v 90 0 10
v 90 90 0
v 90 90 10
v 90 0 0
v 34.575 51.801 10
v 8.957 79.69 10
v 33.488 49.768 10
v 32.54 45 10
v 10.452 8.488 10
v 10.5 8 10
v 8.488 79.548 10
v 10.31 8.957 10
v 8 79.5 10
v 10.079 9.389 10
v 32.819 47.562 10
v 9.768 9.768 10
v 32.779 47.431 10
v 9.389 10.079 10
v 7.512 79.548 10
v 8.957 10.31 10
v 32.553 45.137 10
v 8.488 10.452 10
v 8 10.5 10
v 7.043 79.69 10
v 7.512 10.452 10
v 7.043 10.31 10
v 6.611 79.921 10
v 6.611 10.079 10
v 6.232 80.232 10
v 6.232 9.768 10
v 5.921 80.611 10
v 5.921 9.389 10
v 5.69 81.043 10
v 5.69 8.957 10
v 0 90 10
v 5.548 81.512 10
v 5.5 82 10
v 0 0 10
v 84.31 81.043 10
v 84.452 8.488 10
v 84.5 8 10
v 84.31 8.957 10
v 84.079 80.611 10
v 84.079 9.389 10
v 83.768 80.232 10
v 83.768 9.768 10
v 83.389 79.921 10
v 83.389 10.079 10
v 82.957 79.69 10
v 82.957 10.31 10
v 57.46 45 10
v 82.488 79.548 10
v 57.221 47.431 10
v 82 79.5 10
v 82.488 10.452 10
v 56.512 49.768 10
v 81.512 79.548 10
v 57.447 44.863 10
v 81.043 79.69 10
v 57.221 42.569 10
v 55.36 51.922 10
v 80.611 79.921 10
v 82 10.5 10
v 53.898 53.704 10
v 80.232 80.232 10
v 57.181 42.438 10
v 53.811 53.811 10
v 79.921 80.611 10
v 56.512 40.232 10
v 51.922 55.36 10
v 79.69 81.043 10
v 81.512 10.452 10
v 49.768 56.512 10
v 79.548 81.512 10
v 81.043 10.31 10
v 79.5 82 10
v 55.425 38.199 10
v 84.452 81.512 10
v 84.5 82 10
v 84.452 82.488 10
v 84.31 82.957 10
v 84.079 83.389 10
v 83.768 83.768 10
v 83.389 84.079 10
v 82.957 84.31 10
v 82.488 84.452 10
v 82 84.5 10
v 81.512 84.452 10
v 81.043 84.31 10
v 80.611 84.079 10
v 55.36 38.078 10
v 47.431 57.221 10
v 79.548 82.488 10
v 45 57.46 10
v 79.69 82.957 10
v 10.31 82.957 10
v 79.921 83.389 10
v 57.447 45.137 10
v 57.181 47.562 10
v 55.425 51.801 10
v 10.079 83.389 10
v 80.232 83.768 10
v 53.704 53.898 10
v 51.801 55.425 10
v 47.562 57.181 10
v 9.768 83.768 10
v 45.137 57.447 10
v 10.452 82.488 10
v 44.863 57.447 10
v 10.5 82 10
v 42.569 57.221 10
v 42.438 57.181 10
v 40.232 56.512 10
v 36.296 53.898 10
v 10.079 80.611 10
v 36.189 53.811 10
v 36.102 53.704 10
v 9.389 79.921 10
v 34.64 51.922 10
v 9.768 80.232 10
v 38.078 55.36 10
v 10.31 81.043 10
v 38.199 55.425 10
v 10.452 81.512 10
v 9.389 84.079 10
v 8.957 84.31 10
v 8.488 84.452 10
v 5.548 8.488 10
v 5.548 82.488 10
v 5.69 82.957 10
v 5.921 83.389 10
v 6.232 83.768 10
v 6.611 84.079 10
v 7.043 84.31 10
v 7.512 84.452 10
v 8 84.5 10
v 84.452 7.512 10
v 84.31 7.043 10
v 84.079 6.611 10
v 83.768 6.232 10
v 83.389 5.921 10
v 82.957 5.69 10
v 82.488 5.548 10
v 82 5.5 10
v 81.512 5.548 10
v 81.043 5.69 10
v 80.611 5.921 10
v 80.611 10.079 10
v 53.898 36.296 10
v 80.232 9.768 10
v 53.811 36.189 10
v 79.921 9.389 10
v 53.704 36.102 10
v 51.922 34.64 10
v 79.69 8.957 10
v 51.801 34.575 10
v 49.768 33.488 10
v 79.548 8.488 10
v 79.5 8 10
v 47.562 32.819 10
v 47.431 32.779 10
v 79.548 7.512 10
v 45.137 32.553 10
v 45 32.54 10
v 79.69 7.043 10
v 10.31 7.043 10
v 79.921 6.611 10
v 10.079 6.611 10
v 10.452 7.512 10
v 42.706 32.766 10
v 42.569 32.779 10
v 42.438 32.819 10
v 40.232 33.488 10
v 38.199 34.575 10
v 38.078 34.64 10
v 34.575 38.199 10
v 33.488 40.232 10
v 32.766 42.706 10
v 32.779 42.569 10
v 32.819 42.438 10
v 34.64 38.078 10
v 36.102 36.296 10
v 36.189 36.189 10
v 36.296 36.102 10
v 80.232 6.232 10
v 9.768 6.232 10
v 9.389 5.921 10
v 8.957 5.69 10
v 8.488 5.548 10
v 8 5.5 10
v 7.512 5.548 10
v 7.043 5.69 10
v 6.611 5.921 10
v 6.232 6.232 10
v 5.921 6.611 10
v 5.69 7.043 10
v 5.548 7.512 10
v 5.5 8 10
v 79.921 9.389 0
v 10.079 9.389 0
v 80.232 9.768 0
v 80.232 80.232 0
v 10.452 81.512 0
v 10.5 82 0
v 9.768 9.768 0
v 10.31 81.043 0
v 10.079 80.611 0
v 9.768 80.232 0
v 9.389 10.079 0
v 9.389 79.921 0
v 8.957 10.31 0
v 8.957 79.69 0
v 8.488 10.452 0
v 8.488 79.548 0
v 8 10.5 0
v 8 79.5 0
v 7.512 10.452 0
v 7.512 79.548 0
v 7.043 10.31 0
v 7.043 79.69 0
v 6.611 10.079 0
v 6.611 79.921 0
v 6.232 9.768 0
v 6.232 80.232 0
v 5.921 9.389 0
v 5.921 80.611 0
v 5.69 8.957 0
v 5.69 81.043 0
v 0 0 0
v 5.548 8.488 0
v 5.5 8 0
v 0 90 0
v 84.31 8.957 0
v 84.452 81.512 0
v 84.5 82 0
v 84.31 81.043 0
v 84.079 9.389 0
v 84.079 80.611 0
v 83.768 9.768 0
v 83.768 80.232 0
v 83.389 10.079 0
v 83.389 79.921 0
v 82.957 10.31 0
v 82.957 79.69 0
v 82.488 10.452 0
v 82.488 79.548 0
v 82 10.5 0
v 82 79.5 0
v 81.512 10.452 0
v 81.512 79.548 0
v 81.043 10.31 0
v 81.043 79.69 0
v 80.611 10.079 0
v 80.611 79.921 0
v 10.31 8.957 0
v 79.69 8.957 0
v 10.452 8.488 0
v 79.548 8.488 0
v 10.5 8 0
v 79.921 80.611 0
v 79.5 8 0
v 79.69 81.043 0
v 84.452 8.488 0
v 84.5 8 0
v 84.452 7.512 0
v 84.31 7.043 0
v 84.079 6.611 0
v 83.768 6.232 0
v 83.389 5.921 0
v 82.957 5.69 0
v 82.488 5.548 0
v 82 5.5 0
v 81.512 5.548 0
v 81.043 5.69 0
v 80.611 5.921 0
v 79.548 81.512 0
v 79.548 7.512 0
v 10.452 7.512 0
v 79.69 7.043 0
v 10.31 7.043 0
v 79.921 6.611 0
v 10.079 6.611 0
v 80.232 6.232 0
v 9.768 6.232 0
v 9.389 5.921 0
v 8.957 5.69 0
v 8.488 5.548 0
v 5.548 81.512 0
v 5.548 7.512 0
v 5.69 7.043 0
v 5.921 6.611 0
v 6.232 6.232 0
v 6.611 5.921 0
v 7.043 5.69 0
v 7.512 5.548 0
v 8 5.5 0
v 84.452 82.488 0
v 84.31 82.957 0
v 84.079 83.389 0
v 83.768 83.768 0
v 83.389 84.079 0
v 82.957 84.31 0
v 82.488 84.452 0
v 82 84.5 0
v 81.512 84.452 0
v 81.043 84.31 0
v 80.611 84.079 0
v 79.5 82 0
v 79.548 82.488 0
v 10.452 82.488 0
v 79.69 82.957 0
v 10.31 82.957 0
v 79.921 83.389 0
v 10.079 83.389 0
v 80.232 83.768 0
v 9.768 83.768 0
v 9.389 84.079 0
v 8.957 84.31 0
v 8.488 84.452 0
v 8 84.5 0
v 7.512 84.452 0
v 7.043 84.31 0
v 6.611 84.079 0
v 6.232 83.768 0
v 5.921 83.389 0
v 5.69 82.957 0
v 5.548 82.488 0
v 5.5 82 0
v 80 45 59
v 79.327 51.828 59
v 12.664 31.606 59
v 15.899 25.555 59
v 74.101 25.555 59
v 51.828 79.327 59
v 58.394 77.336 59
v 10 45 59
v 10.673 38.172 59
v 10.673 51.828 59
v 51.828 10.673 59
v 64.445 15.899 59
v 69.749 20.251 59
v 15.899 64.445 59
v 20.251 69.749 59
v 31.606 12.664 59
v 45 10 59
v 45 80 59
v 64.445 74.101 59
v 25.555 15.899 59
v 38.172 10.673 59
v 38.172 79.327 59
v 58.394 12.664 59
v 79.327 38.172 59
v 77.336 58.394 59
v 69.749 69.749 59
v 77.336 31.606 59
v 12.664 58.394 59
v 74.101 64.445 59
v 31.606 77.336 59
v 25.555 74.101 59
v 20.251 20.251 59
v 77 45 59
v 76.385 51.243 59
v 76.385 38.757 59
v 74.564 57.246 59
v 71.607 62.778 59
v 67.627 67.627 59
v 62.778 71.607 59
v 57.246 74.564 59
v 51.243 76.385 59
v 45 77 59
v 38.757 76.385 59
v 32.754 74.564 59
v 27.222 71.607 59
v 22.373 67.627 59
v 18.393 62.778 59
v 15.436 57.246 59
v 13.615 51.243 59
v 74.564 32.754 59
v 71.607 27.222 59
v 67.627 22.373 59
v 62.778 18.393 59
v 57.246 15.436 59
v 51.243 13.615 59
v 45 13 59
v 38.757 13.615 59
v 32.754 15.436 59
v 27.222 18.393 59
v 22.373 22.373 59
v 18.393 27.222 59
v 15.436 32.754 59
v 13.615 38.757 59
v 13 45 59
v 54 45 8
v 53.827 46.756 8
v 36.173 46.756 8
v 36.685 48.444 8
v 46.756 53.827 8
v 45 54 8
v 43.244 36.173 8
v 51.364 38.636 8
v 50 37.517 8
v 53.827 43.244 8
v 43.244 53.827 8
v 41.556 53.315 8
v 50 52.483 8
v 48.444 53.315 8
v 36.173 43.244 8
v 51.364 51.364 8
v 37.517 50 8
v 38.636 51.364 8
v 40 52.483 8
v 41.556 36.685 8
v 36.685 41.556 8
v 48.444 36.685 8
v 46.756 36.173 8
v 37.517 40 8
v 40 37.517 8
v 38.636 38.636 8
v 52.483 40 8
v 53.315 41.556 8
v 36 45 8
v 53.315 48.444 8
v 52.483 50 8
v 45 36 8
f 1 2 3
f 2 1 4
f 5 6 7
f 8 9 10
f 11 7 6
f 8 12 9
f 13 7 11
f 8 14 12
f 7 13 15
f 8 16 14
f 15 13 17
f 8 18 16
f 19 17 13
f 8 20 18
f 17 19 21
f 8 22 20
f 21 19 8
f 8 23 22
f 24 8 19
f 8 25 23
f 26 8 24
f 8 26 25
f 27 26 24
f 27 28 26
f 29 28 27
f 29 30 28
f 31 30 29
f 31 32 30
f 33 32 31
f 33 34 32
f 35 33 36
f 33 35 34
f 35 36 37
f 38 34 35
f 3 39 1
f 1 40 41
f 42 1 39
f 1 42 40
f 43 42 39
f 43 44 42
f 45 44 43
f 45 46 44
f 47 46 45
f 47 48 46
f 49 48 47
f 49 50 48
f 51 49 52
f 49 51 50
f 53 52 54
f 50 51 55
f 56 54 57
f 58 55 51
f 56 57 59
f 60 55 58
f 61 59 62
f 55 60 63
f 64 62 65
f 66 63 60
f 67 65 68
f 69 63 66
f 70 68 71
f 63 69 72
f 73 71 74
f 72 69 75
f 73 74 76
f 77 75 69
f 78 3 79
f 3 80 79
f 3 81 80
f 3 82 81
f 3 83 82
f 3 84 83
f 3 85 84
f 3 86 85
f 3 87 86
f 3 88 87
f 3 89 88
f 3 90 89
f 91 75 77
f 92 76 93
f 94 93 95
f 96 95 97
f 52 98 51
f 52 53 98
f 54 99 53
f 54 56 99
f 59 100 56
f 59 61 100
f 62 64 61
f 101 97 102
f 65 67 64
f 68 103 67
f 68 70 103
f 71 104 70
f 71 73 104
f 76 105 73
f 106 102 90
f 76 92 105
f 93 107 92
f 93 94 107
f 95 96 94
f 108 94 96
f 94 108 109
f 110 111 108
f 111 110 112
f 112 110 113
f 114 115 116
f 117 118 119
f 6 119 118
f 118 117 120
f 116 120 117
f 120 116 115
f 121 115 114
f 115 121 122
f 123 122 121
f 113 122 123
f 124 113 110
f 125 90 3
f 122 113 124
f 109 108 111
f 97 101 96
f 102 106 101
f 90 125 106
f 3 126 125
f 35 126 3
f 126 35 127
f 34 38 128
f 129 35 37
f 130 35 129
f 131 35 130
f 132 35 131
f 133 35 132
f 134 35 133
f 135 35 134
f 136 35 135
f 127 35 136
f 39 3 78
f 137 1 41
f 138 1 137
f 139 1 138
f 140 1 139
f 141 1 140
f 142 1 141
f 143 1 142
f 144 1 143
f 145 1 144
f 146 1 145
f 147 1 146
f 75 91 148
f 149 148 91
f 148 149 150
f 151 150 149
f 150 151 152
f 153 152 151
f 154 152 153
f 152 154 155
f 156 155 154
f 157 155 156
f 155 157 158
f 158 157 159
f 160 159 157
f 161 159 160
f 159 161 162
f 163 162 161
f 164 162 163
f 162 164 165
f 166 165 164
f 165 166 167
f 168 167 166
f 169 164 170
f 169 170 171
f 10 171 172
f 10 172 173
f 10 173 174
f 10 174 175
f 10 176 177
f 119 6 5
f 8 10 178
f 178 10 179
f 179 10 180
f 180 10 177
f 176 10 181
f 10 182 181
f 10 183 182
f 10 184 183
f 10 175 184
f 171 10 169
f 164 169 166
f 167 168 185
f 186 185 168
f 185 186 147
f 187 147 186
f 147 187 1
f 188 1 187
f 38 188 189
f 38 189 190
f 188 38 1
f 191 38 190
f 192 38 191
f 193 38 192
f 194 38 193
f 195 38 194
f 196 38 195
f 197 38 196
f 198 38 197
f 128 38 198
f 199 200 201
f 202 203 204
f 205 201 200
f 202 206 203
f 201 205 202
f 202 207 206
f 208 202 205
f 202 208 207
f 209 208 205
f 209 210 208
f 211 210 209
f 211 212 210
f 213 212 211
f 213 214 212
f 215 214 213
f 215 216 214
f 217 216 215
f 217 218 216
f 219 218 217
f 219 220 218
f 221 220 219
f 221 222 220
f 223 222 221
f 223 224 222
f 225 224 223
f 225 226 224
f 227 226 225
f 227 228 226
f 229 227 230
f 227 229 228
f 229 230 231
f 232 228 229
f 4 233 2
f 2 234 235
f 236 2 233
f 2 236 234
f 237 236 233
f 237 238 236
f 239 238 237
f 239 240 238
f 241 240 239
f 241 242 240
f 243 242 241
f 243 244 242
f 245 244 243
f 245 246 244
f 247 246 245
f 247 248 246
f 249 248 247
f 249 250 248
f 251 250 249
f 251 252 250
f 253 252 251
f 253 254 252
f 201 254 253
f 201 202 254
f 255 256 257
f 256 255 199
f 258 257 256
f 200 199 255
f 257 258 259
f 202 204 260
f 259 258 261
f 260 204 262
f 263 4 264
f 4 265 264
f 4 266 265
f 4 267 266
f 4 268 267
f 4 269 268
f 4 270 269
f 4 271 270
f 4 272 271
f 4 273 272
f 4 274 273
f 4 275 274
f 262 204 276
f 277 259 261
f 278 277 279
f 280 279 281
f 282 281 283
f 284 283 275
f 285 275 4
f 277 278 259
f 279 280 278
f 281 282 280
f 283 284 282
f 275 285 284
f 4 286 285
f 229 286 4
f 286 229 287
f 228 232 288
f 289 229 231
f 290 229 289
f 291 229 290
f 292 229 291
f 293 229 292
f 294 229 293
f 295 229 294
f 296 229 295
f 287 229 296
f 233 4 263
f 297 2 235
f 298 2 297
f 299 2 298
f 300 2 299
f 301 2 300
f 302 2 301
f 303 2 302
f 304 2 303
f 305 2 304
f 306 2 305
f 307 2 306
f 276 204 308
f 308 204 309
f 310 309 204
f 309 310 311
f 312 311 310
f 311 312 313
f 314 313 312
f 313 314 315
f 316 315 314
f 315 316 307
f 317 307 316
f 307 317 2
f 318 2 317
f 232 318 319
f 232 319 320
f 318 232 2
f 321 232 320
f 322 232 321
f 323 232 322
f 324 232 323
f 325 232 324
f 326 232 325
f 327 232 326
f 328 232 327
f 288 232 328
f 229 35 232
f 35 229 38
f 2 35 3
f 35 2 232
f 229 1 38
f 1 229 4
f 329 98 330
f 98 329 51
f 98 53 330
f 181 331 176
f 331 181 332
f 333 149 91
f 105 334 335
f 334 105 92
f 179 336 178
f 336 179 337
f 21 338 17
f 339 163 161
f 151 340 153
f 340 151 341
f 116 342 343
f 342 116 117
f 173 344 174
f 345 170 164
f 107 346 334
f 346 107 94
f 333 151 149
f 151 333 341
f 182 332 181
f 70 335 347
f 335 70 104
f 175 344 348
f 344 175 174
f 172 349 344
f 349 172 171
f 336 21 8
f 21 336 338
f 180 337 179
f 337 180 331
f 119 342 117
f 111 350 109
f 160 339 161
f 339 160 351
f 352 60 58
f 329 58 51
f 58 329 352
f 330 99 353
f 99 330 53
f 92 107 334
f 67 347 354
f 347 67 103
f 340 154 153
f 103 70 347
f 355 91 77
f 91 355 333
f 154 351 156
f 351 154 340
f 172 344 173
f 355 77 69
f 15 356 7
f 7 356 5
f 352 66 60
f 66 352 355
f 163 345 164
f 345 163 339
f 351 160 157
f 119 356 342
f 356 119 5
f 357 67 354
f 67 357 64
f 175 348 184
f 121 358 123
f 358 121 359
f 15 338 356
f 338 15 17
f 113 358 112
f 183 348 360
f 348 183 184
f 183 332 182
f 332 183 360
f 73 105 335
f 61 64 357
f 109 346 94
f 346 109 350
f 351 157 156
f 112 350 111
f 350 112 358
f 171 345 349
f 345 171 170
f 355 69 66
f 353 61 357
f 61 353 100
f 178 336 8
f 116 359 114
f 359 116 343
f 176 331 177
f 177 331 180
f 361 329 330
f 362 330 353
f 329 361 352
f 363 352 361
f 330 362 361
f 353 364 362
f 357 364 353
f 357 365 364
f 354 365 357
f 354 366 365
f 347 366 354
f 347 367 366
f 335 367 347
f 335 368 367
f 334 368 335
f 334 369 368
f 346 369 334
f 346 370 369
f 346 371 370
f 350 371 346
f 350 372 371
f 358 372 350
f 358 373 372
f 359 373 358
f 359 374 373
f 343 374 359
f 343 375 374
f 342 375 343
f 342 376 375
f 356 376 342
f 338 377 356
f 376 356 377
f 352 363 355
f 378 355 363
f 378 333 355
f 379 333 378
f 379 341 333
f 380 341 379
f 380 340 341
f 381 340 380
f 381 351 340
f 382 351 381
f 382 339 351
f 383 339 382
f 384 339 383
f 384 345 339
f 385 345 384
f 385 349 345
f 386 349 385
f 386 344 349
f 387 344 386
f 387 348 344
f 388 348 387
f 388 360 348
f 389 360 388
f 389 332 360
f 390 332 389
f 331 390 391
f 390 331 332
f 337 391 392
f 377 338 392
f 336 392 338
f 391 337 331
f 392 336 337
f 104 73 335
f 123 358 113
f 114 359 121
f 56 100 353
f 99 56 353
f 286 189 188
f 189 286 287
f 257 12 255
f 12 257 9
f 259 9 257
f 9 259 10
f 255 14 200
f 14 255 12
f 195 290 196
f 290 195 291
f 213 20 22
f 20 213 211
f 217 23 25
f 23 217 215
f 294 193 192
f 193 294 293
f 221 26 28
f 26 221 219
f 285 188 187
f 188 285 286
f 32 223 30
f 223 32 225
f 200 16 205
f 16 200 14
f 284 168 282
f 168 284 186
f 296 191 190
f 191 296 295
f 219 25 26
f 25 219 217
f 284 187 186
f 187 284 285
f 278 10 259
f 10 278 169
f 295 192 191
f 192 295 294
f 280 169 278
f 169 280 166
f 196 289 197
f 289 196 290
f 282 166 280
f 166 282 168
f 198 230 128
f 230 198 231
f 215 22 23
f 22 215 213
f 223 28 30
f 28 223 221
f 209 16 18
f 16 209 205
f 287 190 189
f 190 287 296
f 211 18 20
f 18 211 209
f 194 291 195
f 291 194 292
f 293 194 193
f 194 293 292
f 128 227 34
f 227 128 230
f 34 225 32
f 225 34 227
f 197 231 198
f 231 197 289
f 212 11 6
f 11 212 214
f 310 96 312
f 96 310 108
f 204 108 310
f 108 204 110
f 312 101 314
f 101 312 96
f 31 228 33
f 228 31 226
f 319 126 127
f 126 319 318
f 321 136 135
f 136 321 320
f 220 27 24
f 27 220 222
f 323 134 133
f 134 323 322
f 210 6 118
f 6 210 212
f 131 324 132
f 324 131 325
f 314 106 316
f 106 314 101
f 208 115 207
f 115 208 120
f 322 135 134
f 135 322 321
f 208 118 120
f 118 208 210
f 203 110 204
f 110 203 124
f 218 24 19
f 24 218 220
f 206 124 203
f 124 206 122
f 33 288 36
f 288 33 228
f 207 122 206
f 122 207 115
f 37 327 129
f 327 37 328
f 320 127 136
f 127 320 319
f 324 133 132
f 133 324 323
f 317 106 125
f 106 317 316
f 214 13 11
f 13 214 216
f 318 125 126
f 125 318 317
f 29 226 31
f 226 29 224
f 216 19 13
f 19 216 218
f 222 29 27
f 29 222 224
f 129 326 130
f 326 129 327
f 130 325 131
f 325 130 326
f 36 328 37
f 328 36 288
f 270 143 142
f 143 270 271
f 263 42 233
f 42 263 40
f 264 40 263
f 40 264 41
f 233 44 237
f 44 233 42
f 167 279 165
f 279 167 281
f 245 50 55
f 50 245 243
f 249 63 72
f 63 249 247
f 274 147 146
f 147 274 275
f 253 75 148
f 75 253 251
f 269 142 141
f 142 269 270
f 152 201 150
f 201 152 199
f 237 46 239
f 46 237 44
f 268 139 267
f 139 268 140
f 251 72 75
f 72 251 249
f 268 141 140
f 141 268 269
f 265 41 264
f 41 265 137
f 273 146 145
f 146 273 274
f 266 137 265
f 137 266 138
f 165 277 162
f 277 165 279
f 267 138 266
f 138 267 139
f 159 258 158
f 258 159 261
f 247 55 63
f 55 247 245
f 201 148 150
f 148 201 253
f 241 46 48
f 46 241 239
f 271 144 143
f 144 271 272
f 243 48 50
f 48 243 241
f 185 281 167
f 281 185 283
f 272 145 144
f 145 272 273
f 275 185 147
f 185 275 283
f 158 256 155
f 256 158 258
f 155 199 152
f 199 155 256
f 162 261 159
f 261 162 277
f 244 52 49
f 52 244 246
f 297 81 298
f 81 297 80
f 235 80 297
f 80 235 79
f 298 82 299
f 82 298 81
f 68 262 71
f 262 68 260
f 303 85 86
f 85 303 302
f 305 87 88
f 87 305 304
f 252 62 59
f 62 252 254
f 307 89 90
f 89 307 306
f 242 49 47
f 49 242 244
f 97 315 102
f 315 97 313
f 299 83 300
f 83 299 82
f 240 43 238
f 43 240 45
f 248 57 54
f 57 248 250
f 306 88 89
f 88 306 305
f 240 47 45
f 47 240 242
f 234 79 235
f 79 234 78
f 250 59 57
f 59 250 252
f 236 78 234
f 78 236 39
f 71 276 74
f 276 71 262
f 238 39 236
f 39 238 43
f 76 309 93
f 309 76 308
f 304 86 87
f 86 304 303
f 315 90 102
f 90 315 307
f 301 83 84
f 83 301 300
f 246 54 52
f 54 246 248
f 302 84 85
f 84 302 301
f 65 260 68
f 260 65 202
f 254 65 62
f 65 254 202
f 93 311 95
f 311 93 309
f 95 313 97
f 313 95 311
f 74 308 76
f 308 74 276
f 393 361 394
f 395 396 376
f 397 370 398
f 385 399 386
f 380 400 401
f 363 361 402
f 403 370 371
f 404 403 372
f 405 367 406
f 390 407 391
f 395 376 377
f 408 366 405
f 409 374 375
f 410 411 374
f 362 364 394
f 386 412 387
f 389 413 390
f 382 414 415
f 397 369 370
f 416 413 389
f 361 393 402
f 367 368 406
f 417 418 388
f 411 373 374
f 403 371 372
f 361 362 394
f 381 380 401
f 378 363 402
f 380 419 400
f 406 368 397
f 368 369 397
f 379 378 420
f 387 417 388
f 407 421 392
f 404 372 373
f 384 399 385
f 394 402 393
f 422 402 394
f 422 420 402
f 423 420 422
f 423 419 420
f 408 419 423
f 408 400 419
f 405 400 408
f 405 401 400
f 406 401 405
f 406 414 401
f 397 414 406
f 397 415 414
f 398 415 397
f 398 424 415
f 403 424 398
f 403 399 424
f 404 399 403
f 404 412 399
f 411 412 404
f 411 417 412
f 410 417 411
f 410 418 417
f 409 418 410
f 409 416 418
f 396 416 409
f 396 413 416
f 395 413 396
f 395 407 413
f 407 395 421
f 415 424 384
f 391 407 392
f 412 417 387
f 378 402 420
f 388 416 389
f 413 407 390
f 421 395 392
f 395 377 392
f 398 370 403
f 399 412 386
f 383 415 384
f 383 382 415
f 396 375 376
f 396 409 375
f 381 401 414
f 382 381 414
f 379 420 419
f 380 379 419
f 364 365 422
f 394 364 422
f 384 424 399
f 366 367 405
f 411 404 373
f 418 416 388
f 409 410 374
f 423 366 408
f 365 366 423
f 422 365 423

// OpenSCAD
$fn = 32;

// ----------------------------------------------------------------------
// Hopper: flanged with square flange
// ----------------------------------------------------------------------

// --- parameters (mm) ---
fl = 90;                  // flange side, X and Y
fl_t = 10;                // flange thickness
cone_h = 50;              // cone height above the flange
top_d = 70;               // cone mouth diameter
bot_d = 24;               // cone spout diameter
wall = 3;                 // cone wall thickness
hole_r = 2.5;             // flange hole radius
hole_in = 8;              // hole inset from the corners

bore_d = bot_d - 2 * wall;  // spout bore diameter
total_h = fl_t + cone_h - 1;  // overall height

difference() {
  union() {
    cube([fl, fl, fl_t]);
    translate([fl / 2, fl / 2, fl_t - 1])
      cylinder(h = cone_h, d1 = bot_d, d2 = top_d);
  }
  translate([fl / 2, fl / 2, fl_t - 2])
    cylinder(h = cone_h + 1, d1 = bore_d, d2 = top_d - 2 * wall);
  for (sx = [0, 1], sy = [0, 1])
    translate([sx ? fl - hole_in : hole_in,
               sy ? fl - hole_in : hole_in, -1])
      cylinder(r = hole_r, h = fl_t + 2);
}
